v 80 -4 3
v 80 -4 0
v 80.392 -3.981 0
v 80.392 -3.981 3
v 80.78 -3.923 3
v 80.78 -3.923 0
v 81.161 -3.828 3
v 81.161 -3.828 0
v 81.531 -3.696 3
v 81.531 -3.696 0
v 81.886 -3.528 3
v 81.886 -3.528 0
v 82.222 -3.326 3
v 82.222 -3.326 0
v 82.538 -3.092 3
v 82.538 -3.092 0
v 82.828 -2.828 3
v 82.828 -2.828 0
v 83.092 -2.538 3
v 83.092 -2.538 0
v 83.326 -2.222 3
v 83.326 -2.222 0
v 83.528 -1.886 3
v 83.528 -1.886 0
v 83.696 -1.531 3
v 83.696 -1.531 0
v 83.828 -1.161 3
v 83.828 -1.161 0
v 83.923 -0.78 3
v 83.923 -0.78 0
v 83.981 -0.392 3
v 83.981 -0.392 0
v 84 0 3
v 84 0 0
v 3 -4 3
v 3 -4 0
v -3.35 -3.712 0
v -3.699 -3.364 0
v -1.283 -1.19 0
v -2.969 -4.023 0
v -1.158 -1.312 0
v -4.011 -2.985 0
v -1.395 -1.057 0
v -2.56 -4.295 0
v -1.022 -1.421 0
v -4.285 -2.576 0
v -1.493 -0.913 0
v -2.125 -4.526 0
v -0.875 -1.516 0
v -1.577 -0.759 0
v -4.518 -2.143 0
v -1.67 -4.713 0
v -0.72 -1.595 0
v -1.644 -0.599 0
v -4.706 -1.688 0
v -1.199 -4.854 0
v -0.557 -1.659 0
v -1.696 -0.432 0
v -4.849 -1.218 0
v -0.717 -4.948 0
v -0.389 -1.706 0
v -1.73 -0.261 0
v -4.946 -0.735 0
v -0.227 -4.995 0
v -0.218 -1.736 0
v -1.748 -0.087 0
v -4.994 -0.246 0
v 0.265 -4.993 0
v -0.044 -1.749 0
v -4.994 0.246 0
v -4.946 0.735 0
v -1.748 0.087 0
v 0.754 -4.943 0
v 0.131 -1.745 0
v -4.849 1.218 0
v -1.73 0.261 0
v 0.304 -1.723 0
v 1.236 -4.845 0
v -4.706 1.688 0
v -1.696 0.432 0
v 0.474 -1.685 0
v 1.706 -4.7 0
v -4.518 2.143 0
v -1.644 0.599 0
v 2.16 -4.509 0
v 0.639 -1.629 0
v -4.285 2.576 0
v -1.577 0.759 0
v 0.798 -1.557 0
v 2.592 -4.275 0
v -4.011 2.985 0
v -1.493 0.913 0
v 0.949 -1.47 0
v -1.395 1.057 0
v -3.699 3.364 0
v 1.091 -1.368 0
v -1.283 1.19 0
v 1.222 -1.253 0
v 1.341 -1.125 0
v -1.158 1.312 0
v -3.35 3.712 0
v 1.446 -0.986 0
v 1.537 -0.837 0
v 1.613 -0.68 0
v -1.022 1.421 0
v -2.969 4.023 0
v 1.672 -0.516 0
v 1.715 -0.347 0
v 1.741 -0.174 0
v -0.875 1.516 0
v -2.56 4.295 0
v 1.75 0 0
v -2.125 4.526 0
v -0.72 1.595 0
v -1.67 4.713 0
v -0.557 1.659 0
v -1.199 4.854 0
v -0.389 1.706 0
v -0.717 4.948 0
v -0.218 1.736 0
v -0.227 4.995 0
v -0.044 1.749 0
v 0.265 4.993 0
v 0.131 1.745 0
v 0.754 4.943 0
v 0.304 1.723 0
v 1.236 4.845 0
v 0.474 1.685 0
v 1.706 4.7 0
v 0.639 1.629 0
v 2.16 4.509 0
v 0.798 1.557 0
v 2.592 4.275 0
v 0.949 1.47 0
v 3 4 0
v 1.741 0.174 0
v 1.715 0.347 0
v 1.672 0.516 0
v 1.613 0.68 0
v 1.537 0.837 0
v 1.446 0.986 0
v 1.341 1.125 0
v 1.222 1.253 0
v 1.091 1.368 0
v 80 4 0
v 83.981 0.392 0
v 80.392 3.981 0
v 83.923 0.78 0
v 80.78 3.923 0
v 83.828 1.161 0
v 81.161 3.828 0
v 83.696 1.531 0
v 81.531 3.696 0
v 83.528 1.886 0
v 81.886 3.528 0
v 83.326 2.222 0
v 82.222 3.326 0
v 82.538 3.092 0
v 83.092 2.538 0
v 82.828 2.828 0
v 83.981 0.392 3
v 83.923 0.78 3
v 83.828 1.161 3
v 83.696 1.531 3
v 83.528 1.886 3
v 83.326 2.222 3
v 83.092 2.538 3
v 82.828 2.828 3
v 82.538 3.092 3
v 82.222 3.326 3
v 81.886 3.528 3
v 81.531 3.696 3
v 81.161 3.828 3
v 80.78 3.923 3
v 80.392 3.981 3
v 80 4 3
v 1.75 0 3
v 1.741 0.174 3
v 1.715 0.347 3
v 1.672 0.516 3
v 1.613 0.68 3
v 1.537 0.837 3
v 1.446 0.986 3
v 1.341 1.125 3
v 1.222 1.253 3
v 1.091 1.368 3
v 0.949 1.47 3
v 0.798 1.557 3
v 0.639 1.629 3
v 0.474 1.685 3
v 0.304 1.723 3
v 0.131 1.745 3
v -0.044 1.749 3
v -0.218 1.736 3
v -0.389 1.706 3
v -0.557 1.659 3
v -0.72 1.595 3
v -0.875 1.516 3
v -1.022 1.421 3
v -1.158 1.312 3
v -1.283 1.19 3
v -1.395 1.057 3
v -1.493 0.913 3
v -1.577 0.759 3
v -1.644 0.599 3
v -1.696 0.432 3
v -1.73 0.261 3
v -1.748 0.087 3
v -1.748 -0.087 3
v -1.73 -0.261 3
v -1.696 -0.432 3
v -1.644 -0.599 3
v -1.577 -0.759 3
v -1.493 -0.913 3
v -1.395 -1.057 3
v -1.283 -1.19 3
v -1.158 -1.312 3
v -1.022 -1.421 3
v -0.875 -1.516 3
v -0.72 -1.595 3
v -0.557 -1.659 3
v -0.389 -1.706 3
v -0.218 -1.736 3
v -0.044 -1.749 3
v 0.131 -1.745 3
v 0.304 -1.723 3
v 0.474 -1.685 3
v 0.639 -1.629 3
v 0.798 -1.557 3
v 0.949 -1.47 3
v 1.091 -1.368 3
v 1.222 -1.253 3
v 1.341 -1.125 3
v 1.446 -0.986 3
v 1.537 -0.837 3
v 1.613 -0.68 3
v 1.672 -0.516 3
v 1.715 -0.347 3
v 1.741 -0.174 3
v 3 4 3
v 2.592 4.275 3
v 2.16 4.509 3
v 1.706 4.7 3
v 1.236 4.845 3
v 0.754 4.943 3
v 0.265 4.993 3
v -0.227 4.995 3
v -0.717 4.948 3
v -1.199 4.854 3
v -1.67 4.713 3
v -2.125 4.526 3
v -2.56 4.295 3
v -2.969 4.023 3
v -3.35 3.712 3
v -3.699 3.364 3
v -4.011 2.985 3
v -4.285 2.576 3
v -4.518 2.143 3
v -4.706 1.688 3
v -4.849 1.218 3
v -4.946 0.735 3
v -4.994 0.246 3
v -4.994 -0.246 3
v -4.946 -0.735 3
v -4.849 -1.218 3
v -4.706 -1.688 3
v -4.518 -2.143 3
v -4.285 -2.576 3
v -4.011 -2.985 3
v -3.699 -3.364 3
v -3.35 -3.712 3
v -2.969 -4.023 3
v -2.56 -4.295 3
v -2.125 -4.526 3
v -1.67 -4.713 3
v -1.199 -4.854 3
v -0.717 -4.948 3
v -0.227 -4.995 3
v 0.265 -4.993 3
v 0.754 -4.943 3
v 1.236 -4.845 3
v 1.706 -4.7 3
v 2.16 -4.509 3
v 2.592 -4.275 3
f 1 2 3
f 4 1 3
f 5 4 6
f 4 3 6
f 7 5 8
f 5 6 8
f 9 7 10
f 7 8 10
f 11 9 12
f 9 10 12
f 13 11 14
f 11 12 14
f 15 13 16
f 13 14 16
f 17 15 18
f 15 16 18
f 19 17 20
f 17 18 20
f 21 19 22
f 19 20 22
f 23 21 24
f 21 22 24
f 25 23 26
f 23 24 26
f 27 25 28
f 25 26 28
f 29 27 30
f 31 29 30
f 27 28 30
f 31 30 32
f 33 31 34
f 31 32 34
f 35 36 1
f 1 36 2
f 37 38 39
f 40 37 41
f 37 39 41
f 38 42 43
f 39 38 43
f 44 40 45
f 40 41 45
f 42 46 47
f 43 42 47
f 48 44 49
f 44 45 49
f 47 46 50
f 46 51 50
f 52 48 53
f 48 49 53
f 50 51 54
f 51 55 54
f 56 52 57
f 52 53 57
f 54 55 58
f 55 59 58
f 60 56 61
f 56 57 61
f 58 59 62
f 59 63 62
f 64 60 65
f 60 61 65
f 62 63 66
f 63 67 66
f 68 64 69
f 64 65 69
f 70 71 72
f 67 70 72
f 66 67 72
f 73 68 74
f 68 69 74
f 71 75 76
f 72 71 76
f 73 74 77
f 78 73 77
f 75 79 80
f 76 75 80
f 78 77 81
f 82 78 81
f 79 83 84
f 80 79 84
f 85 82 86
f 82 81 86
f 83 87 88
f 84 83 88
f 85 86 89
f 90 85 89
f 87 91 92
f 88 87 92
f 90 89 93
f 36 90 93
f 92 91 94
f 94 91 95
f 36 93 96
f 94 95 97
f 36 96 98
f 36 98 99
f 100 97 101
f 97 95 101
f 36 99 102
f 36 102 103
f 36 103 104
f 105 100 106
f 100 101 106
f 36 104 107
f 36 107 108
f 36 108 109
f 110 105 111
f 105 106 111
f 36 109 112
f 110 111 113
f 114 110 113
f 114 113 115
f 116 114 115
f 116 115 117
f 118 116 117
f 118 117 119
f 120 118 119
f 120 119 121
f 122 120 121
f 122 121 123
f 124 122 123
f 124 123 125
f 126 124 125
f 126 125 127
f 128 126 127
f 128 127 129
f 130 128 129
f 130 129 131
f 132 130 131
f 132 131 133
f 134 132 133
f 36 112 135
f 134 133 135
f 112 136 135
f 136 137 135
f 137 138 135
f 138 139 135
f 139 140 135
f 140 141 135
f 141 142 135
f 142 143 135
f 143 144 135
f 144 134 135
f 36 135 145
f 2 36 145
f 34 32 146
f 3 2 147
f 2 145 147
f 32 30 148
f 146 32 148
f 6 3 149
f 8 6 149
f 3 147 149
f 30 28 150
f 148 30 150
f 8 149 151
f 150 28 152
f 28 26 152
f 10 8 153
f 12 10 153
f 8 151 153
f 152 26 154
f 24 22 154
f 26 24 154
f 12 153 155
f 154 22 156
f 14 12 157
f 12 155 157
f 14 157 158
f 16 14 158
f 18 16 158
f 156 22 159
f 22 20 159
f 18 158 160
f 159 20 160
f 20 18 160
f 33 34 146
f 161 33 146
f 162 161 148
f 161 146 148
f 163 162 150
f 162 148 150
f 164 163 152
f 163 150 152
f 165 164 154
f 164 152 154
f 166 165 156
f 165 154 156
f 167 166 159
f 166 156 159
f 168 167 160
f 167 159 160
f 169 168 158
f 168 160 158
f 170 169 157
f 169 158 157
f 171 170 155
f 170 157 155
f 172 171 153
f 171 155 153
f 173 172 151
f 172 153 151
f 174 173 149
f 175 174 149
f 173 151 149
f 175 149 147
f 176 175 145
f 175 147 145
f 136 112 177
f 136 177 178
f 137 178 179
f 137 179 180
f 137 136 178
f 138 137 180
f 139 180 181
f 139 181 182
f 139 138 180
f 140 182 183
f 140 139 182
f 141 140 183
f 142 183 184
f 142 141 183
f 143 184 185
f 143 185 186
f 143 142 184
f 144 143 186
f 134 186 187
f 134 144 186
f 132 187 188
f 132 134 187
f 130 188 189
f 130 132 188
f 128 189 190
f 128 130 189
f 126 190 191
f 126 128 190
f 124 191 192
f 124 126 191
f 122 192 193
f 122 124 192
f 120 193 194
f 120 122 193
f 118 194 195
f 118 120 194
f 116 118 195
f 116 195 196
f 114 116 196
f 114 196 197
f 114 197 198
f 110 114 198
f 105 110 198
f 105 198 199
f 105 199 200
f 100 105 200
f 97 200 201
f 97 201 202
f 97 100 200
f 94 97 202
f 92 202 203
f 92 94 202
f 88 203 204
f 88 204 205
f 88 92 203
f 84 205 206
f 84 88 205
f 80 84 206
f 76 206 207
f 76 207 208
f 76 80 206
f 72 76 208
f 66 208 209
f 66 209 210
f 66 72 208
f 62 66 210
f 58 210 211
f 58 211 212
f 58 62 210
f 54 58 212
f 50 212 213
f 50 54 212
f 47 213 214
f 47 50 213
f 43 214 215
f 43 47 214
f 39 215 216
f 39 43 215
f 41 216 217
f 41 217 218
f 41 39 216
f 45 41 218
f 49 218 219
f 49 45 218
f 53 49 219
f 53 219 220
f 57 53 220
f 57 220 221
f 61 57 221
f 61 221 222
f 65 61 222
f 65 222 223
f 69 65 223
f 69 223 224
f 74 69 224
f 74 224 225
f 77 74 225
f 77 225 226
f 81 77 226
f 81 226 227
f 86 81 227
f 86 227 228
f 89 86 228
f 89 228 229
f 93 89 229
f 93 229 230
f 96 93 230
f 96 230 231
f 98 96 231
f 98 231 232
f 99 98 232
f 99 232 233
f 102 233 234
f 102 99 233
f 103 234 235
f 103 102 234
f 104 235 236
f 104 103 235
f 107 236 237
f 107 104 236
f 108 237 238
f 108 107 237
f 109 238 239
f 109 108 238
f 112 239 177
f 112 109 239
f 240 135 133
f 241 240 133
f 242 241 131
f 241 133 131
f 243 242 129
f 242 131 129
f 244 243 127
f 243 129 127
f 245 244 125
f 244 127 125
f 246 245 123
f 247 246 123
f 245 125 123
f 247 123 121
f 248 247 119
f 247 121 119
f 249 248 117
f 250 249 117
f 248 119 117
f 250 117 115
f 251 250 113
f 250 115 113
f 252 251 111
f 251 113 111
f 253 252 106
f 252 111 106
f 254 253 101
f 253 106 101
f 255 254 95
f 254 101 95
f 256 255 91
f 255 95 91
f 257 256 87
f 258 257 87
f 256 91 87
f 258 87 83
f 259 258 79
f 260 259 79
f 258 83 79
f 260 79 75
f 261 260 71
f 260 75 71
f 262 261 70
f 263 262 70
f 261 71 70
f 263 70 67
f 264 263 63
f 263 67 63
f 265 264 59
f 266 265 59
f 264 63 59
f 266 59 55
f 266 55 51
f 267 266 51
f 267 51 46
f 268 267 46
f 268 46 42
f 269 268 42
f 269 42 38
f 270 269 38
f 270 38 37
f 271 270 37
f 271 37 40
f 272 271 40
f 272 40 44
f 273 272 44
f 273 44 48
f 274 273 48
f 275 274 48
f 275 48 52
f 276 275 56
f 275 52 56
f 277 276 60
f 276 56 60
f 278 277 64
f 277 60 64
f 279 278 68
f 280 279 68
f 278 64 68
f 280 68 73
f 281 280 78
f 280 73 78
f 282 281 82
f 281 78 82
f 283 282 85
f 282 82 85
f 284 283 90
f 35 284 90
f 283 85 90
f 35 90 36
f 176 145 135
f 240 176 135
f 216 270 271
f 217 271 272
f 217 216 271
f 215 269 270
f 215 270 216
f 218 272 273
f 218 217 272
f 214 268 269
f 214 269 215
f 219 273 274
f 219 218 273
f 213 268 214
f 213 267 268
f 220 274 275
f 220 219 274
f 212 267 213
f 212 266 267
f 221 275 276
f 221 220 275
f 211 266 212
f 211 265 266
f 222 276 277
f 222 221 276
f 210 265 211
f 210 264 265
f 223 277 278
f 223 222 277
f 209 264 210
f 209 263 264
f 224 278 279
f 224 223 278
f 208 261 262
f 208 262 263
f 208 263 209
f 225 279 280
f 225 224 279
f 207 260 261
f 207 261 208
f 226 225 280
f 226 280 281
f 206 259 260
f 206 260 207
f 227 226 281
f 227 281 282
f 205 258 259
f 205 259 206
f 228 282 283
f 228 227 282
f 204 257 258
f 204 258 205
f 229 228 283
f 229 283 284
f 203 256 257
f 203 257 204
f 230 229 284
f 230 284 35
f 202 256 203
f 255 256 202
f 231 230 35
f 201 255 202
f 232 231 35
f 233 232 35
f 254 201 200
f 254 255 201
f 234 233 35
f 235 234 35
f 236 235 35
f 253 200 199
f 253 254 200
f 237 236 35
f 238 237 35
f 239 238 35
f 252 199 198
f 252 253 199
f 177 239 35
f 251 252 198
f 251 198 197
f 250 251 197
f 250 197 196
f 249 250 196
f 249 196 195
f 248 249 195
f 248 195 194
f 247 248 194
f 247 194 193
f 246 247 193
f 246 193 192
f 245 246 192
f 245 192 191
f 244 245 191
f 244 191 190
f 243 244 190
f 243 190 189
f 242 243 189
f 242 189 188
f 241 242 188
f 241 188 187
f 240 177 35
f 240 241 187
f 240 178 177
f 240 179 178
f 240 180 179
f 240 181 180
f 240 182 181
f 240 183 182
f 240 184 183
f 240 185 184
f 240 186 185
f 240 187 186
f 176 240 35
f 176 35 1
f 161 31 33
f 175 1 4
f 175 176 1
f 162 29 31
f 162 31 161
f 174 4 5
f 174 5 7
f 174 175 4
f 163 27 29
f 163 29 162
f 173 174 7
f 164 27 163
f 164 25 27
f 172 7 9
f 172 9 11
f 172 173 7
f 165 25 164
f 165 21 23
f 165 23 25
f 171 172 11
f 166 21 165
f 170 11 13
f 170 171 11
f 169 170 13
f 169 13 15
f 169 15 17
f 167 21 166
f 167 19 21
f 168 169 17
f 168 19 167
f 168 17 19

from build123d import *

# Parameters (mm, degrees)
F0_R     = 1.75
F1_DEPTH = 3


with BuildPart() as f1:
    # F0 (on Top) → F1 (new body)
    with BuildSketch(Plane.XY):
        with BuildLine():
            Line((80, 4), (3, 4))
            ThreePointArc((3, 4), (-5, 0), (3, -4))
            Line((3, -4), (80, -4))
            ThreePointArc((80, -4), (76, 0), (80, 4))
        make_face()
        Circle(F0_R, mode=Mode.SUBTRACT)
        with BuildLine():
            ThreePointArc((84, 0), (82.828427, 2.828427), (80, 4))
            ThreePointArc((80, 4), (76, 0), (80, -4))
            ThreePointArc((80, -4), (82.828427, -2.828427), (84, 0))
        make_face()
    extrude(amount=F1_DEPTH)


solid = f1.part
